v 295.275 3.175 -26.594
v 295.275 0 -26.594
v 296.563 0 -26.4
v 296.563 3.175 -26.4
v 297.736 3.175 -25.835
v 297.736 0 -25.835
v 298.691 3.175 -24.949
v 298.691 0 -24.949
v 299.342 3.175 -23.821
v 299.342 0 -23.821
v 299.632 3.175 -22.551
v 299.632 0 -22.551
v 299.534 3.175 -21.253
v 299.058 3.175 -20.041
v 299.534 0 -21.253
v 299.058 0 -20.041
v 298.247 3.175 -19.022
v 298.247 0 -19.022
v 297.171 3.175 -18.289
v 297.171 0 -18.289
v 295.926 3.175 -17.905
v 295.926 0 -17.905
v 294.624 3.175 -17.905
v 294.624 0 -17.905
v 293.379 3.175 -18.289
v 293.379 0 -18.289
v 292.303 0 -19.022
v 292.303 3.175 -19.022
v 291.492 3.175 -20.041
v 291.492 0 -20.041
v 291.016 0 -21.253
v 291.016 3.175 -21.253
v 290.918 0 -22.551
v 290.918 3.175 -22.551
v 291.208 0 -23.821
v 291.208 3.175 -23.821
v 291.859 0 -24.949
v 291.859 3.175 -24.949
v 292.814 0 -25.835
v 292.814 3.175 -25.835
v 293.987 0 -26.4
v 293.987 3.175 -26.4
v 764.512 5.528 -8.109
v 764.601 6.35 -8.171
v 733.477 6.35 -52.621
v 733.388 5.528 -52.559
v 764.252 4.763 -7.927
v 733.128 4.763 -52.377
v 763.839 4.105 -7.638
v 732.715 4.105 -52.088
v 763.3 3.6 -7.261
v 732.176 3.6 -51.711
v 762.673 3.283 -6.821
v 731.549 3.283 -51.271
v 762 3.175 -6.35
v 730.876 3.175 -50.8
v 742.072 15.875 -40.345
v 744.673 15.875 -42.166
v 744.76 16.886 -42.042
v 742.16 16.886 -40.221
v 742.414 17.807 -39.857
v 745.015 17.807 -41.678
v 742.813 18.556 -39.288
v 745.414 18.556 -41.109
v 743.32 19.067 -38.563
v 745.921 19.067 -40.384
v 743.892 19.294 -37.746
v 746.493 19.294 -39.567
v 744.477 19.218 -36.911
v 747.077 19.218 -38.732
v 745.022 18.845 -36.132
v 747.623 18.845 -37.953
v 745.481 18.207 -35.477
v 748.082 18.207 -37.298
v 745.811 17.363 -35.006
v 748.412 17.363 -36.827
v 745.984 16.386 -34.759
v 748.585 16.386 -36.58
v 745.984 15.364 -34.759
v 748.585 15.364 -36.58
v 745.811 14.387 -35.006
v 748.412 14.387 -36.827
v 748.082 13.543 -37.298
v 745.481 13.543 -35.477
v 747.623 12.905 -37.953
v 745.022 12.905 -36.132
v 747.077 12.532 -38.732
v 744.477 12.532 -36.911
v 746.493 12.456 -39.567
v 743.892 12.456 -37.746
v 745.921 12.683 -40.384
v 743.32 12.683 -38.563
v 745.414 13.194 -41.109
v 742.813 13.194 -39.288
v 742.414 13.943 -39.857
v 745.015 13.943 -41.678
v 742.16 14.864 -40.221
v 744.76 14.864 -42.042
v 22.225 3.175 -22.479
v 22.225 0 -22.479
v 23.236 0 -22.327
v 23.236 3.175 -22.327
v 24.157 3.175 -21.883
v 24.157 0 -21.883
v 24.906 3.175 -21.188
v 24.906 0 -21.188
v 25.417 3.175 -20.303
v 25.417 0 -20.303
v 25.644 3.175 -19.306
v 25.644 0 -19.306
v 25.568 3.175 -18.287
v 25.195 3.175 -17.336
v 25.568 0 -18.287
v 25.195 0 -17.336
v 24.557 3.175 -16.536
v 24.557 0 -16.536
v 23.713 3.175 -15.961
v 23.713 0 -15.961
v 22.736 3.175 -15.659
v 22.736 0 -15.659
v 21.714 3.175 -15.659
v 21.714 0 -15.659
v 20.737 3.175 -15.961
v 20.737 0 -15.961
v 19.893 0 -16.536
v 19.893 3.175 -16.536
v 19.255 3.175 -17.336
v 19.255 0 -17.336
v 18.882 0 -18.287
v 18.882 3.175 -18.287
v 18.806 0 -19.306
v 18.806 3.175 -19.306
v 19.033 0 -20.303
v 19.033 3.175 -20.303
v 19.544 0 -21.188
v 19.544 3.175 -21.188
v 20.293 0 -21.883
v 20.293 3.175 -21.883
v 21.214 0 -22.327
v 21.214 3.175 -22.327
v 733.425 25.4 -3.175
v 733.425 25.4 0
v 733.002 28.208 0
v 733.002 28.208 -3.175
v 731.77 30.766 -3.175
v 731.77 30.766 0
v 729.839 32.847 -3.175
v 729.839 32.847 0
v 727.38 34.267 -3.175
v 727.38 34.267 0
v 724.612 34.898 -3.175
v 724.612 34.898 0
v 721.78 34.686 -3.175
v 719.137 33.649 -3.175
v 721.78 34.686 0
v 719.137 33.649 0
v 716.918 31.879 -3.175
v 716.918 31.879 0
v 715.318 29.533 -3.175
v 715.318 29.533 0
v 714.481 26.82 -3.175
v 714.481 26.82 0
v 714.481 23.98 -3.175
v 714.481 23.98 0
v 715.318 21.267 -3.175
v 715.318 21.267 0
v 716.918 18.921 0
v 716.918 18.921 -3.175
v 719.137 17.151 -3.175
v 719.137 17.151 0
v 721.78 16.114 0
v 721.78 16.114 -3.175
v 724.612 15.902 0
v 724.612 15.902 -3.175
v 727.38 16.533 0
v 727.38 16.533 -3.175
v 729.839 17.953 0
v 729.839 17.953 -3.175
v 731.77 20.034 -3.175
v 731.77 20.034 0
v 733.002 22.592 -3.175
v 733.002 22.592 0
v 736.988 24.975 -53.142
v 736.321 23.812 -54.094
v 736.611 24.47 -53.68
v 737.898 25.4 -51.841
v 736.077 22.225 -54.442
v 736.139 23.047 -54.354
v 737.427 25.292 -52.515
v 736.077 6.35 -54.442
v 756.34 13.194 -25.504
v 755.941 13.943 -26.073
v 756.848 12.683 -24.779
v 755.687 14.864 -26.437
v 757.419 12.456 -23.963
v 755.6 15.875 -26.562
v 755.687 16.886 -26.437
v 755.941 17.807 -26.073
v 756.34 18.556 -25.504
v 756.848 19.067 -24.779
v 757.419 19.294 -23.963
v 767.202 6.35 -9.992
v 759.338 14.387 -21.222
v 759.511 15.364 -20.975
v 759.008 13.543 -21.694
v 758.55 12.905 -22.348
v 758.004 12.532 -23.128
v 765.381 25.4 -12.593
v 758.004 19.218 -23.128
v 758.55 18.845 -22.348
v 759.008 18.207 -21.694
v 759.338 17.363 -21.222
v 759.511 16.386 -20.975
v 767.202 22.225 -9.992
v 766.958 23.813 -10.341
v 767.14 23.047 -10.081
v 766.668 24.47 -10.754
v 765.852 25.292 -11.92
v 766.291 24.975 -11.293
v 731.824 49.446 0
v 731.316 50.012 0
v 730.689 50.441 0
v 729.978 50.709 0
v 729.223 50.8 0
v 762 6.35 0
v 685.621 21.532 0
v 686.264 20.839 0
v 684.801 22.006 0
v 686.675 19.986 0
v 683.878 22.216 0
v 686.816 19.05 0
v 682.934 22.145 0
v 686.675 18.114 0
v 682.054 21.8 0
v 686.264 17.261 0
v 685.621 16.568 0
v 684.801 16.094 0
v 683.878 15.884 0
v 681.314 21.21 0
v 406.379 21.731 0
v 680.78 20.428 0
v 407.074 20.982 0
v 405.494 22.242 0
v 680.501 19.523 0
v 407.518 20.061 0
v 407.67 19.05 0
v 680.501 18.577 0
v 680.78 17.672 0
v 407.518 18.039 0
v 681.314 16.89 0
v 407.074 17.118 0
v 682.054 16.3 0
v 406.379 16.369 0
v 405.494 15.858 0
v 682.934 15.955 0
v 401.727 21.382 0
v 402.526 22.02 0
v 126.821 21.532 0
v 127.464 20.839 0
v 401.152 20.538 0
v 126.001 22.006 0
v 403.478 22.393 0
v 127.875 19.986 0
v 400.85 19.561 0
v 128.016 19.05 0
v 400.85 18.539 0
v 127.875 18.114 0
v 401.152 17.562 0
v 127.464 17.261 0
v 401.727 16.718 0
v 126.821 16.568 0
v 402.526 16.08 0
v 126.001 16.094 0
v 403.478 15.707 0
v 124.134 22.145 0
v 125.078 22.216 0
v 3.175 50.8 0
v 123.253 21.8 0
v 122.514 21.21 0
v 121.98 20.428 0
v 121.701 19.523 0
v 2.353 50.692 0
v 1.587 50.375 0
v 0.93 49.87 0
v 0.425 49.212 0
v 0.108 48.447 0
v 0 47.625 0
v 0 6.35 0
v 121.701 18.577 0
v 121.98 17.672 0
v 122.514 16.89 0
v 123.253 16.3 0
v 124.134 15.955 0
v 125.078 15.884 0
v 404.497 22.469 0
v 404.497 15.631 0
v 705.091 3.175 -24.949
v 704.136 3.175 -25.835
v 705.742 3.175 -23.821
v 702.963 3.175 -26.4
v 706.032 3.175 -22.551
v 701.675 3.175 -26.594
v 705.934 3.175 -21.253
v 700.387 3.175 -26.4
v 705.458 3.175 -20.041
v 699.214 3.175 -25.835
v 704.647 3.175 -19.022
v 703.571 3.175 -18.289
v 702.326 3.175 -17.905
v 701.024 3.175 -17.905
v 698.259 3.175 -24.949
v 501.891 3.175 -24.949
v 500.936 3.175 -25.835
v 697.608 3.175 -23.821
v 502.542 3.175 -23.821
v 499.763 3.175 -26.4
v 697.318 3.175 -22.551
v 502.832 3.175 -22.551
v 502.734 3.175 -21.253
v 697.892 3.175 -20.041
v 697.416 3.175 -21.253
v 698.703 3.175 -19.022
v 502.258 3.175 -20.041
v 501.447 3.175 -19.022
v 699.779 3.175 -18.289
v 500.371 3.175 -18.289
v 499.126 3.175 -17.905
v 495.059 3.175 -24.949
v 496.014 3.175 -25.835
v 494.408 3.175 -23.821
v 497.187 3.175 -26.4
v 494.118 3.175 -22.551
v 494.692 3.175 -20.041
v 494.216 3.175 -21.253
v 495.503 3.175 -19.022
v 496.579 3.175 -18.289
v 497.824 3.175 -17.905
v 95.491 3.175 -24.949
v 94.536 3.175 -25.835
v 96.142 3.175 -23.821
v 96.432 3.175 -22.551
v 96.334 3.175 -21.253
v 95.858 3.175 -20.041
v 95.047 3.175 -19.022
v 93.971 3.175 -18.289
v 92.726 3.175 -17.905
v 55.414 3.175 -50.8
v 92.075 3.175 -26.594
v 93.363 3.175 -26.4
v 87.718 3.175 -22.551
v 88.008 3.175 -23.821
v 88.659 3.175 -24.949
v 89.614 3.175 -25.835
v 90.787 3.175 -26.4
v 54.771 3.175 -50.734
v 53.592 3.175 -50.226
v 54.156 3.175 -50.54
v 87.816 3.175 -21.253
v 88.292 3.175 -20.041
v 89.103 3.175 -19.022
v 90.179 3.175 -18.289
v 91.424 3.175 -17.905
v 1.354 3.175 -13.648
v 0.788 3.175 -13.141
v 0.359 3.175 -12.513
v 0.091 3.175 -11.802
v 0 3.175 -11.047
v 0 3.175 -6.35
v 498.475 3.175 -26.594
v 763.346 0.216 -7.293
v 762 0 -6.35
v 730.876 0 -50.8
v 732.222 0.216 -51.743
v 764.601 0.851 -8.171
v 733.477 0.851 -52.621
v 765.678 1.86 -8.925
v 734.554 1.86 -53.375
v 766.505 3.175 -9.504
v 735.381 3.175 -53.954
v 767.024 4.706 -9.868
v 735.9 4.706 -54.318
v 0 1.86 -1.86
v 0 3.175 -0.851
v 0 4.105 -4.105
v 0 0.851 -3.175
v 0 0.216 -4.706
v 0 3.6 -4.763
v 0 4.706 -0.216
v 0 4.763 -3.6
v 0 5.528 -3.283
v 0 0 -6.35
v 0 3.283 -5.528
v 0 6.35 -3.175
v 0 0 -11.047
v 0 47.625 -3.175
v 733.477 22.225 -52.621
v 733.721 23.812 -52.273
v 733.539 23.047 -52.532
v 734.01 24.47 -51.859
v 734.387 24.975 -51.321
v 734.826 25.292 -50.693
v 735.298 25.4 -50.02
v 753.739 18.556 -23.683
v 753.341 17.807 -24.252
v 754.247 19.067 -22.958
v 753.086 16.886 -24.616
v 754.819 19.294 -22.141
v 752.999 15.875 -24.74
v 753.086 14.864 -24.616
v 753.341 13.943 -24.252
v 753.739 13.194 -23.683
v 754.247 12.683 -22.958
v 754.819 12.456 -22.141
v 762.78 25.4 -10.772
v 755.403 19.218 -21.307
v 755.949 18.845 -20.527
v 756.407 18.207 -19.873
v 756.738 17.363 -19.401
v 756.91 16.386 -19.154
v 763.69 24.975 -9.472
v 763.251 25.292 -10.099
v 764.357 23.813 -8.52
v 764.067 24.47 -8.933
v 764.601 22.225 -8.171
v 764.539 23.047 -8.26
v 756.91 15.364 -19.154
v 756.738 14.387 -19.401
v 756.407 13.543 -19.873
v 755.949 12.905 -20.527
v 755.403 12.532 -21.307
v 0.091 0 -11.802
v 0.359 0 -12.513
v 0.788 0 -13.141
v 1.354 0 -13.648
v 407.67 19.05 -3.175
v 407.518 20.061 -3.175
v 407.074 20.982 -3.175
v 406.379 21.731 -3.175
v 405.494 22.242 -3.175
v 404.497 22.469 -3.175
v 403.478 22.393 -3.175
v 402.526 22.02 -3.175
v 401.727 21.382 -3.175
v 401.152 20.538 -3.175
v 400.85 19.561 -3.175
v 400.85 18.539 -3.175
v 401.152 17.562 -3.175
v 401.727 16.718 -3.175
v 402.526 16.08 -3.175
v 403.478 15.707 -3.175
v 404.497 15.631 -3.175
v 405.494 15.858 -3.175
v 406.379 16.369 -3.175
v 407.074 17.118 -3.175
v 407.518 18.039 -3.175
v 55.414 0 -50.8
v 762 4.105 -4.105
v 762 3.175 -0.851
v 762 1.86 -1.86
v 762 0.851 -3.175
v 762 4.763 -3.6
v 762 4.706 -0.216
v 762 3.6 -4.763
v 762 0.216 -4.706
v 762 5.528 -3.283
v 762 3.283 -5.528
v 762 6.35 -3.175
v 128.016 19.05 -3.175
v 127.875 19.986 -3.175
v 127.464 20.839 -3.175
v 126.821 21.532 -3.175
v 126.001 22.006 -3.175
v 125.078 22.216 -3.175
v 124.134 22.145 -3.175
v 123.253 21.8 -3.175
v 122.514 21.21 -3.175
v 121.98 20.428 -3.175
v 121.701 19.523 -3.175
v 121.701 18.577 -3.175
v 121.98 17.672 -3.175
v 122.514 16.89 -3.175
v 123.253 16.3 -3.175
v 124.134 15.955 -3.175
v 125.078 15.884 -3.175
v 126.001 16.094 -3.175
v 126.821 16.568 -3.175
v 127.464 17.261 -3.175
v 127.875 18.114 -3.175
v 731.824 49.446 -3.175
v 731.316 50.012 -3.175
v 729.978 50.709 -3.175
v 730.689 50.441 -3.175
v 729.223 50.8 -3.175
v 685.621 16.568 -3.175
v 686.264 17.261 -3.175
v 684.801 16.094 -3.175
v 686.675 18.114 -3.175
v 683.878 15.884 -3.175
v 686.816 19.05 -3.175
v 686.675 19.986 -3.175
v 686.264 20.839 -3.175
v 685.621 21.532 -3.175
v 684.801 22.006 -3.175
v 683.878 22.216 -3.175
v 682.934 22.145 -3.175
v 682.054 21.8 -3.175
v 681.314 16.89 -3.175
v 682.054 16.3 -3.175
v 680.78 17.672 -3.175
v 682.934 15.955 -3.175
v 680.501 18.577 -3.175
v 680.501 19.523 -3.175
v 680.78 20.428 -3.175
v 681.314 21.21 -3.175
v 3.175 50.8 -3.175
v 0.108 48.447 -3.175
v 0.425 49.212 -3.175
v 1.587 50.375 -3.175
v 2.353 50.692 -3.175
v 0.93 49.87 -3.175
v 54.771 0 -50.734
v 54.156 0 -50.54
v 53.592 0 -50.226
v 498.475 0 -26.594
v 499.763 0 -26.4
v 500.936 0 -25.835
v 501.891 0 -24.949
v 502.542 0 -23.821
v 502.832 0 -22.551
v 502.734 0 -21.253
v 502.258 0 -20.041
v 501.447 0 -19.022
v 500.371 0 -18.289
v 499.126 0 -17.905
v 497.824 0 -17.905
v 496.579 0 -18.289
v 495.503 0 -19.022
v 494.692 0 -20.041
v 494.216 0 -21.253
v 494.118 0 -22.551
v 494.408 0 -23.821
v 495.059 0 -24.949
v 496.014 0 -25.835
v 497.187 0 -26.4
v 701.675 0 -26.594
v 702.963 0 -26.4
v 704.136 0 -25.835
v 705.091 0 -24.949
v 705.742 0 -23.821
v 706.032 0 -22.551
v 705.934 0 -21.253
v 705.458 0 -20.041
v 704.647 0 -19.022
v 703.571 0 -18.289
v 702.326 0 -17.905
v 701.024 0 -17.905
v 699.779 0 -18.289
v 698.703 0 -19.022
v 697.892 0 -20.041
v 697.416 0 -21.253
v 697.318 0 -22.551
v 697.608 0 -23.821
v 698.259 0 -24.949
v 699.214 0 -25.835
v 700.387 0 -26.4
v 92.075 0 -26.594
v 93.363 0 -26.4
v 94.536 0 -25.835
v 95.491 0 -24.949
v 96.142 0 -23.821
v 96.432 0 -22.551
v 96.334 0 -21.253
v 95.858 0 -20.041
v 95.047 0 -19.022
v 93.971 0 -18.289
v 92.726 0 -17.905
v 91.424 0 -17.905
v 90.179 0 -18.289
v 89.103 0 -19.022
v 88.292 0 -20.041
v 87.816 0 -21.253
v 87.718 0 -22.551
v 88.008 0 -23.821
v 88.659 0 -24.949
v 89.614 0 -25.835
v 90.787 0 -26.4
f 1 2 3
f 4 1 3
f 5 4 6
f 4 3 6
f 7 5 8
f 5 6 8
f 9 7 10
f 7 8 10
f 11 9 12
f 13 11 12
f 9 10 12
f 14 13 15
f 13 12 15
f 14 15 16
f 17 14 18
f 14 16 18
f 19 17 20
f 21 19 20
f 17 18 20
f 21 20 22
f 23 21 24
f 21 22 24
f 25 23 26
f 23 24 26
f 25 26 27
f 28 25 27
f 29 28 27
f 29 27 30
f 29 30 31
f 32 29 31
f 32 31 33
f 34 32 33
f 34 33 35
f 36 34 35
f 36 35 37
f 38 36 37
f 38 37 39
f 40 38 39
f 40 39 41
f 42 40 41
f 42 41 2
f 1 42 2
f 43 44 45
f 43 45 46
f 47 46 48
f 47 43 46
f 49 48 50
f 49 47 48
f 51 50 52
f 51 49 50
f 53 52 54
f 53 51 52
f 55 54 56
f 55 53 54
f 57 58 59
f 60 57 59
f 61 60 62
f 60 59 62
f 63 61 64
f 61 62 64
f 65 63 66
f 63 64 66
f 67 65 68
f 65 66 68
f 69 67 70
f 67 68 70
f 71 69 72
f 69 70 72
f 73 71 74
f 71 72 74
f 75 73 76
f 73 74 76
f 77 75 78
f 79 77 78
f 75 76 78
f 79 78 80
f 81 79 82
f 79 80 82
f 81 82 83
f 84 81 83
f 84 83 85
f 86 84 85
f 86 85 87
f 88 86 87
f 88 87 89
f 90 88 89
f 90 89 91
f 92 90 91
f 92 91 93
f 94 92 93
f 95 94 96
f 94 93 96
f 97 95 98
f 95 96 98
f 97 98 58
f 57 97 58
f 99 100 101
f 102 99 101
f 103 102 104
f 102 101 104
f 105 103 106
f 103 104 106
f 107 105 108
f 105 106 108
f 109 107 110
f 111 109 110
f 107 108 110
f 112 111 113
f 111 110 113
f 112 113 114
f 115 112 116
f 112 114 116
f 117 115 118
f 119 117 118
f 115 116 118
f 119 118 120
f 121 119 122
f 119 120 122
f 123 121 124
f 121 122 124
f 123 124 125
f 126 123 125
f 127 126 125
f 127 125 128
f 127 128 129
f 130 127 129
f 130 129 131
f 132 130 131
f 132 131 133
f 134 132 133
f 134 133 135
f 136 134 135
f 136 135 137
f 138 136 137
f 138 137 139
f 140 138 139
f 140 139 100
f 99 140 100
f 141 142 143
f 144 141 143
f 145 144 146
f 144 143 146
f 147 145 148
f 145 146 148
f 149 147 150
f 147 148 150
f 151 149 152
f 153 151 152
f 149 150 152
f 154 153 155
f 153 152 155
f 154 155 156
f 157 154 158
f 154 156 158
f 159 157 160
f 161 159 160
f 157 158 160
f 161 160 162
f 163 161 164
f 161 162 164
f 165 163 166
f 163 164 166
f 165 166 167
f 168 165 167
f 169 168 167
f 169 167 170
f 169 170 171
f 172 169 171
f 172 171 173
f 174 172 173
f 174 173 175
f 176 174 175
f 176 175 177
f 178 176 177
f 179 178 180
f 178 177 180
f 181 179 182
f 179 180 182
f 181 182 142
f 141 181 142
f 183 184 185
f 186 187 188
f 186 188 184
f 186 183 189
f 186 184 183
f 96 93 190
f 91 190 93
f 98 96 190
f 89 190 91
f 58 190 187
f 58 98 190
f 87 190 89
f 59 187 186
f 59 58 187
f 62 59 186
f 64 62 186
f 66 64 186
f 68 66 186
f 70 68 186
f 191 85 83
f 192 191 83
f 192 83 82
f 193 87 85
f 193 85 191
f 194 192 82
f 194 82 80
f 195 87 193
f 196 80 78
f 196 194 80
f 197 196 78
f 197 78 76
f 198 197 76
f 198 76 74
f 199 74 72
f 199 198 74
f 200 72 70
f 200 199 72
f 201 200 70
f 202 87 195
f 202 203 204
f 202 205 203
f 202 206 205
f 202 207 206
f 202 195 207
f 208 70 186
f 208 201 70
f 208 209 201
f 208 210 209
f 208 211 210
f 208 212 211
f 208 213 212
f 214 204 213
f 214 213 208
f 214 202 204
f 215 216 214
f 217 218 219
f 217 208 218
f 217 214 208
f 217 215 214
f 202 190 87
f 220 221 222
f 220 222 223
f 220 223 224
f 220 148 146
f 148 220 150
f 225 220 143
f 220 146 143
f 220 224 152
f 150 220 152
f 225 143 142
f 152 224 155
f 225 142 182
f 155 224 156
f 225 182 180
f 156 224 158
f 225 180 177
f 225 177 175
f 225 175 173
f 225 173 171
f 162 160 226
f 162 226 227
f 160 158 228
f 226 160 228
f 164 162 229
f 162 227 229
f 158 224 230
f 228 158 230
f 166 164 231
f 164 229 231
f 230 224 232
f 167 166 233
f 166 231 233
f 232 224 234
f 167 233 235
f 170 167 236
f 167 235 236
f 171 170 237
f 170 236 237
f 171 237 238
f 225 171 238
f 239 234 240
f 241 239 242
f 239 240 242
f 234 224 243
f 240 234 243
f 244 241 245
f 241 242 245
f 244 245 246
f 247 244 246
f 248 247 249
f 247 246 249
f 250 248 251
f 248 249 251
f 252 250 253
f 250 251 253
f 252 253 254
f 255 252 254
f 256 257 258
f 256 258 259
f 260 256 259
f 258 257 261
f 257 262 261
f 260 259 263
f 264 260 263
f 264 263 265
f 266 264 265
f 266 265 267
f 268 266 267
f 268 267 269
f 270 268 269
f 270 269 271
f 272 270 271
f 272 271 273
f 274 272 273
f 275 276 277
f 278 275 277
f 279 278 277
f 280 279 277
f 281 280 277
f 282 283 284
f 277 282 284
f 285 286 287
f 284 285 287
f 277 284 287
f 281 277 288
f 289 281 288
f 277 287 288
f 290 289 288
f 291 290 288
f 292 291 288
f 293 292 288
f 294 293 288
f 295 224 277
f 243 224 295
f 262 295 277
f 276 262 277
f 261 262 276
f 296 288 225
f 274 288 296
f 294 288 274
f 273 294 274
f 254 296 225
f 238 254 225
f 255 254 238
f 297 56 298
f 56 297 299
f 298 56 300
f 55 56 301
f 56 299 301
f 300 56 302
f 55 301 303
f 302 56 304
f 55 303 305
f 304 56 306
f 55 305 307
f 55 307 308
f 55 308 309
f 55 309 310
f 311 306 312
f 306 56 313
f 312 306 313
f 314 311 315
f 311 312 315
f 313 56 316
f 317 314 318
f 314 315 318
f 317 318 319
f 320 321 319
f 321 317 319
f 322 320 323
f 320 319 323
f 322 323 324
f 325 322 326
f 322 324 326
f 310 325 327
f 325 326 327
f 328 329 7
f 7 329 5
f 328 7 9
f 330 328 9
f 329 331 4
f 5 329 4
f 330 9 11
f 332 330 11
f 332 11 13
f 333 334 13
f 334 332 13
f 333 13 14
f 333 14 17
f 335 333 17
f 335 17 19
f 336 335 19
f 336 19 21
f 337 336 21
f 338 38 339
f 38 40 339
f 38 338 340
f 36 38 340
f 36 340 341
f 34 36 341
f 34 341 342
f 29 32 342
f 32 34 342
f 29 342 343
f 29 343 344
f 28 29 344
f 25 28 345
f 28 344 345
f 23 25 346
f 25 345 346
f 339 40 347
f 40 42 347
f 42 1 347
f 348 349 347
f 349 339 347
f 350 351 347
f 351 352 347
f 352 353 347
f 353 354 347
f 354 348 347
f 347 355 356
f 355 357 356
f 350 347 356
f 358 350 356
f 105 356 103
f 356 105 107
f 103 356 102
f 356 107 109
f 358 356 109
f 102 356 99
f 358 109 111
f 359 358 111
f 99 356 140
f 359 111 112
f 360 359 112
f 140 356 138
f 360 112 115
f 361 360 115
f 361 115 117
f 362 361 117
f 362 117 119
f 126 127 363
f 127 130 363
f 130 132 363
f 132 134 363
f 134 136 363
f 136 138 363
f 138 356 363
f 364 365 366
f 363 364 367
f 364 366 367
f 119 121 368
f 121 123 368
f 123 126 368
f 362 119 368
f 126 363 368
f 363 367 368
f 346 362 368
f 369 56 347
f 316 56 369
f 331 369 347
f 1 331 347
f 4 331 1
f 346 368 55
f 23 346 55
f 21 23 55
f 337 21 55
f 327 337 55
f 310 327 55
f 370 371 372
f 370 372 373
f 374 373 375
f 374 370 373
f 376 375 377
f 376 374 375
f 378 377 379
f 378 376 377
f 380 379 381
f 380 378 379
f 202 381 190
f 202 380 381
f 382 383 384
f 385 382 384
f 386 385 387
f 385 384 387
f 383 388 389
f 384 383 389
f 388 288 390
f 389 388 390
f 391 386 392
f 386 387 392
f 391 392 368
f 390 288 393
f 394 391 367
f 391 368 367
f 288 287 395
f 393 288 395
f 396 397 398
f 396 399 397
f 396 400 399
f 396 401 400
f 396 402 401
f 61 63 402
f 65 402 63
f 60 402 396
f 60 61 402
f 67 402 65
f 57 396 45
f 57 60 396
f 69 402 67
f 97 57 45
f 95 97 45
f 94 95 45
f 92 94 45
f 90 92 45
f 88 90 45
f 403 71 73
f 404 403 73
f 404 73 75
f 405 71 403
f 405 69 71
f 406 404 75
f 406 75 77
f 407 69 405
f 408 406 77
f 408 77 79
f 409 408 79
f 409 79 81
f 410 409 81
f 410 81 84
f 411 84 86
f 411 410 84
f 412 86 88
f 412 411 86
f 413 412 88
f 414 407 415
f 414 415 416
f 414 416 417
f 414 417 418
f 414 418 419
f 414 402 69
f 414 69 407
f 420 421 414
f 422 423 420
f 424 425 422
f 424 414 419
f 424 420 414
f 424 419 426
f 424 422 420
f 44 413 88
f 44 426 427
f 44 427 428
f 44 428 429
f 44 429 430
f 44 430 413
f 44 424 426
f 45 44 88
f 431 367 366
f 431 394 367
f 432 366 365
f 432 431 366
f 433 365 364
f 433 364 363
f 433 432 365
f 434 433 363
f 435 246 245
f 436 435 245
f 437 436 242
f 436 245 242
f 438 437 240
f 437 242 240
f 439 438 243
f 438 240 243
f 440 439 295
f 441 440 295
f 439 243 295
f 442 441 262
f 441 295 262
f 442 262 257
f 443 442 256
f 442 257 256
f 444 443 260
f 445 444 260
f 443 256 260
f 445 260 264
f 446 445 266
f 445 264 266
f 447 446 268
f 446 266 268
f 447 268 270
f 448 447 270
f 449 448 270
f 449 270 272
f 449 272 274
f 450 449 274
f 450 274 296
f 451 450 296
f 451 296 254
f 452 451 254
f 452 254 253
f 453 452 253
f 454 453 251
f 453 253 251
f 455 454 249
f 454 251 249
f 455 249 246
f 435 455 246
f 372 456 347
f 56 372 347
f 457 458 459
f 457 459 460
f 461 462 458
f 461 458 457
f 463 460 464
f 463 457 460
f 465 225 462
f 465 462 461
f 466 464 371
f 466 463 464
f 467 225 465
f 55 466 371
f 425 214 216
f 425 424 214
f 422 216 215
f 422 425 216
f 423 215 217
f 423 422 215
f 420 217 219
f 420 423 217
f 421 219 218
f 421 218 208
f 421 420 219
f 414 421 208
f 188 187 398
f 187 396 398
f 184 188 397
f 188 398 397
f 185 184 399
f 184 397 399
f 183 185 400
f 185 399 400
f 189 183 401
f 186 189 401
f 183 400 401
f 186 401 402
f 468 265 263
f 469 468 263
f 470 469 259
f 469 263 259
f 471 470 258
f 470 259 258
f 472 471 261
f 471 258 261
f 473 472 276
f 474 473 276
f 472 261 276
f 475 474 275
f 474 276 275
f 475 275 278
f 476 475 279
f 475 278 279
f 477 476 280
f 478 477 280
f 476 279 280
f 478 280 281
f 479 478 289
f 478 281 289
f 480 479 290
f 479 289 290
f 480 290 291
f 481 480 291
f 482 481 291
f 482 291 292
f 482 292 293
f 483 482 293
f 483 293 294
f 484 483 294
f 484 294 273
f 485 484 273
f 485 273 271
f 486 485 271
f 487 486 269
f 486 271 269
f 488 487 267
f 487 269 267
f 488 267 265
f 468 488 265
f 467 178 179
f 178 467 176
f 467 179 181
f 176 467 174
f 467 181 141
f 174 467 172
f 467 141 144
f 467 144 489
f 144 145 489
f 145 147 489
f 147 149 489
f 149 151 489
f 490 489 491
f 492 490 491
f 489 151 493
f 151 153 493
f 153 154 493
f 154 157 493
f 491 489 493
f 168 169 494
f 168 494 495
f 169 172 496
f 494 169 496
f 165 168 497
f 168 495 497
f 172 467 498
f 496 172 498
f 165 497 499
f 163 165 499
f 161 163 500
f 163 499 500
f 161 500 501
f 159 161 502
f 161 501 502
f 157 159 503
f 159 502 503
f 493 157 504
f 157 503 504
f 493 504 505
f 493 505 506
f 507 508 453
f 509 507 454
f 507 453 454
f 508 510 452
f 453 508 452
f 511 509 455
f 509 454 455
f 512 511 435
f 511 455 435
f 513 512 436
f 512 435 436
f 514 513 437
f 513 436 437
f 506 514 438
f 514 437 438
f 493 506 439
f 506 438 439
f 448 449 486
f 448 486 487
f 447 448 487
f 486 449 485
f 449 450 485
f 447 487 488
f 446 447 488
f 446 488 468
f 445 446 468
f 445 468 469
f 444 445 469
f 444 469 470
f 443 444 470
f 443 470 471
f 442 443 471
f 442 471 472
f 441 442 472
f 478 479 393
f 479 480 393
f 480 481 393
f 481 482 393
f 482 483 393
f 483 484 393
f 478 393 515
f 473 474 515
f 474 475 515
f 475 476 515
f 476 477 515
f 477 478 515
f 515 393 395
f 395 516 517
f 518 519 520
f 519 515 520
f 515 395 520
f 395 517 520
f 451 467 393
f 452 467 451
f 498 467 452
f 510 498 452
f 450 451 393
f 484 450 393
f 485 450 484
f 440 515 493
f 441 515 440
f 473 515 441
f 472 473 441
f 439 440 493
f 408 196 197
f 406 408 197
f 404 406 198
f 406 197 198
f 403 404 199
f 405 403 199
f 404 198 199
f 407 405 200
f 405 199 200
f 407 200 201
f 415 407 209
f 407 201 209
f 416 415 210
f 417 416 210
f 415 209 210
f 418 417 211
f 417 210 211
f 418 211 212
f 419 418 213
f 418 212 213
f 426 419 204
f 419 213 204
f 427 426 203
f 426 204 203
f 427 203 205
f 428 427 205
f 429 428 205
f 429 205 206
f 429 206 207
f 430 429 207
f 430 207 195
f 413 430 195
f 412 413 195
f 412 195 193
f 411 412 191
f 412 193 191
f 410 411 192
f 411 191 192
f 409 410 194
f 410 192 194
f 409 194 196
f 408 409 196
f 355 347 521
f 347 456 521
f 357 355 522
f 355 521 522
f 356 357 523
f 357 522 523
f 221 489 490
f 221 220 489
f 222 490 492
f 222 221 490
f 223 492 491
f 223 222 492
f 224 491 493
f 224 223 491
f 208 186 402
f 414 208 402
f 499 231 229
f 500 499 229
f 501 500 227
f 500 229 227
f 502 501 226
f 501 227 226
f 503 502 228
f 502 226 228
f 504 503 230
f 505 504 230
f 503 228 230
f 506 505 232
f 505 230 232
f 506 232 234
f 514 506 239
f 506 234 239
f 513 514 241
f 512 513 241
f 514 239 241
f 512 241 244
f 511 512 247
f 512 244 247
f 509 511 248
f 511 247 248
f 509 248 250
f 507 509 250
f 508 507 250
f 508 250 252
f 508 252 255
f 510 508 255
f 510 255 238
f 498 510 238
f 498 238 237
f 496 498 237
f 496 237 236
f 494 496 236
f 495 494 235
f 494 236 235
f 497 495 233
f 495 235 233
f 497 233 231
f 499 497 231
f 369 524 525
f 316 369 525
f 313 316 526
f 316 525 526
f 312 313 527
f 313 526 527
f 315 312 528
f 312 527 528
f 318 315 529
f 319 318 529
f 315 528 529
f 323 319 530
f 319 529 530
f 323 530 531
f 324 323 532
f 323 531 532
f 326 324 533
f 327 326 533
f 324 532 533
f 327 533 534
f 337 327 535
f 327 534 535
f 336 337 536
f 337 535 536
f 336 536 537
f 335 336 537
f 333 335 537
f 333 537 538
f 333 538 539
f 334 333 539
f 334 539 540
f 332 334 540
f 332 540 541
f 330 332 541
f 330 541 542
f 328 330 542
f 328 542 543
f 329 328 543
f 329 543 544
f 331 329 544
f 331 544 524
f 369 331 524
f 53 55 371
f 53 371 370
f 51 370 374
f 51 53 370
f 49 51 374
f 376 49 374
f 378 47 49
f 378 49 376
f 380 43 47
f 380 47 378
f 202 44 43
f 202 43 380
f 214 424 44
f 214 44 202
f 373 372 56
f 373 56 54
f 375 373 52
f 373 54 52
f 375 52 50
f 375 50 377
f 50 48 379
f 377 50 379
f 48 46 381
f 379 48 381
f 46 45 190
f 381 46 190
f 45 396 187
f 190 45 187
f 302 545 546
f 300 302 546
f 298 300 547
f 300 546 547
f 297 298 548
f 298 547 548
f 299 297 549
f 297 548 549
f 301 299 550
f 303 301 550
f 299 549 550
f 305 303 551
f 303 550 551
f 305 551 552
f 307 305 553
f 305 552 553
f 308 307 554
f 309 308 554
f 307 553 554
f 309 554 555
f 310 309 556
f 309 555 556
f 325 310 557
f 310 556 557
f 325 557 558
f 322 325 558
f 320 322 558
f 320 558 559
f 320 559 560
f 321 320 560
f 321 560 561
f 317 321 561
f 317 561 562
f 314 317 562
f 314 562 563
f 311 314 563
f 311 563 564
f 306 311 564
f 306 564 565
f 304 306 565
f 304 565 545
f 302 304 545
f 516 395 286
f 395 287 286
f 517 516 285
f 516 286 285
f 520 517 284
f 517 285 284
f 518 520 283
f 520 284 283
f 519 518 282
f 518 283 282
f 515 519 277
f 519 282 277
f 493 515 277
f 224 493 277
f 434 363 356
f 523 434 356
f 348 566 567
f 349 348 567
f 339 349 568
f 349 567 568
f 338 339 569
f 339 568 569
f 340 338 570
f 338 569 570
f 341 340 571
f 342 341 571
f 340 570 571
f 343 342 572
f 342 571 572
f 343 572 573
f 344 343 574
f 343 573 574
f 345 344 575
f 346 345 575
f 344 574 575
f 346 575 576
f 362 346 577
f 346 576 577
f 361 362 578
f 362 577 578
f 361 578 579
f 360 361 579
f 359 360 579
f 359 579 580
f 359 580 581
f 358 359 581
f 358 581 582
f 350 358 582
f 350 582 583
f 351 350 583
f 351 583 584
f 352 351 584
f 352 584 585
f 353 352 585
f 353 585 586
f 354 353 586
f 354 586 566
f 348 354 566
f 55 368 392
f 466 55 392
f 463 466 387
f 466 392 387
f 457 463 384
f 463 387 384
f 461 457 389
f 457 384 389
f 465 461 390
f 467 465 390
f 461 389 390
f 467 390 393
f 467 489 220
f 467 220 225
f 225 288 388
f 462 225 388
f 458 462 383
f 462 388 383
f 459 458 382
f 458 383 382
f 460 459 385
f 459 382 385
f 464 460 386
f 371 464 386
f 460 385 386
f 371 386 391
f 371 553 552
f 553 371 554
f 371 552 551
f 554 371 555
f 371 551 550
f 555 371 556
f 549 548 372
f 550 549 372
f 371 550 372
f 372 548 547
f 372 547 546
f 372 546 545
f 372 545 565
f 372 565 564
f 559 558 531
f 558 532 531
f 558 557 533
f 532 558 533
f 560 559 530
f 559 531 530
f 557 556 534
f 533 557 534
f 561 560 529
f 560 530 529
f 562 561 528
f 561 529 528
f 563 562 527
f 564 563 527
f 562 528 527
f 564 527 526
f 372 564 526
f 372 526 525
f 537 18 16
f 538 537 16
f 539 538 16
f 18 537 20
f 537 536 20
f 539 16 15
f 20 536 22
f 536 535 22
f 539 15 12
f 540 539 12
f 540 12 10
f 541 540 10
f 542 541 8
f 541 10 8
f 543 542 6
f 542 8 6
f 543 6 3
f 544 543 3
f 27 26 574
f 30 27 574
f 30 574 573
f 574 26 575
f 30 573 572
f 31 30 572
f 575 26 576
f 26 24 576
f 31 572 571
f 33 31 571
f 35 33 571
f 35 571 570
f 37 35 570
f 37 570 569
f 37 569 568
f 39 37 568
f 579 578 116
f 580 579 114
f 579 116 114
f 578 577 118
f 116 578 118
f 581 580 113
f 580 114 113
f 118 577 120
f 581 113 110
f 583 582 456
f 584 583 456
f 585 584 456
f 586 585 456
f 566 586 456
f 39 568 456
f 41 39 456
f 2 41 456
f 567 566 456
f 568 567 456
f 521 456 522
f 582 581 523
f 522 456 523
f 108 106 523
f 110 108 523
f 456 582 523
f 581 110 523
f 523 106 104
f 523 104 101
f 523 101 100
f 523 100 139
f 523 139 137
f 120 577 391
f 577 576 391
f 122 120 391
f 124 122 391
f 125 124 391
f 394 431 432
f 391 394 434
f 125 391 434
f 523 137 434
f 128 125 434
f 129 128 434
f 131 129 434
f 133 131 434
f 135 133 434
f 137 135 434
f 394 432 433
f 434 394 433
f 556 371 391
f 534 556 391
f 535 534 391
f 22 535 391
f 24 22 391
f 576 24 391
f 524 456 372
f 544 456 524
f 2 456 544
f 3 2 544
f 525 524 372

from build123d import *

# Parameters (mm, degrees)
BASE_FLANGE1_DEPTH = 762
CUT_EXTRUDE1_DEPTH = 3.175
CUT_EXTRUDE2_DEPTH = 3.175
EDGE_FLANGE1_DEPTH = 54.26343047
SKETCH9_R          = 3.175
SKETCH9_R_2        = 9.525
SKETCH9_R_3        = 3.429
CUT_EXTRUDE3_DEPTH = 3.175
SKETCH10_R         = 4.3688
SKETCH10_R_2       = 3.429
CUT_EXTRUDE4_DEPTH = 4.9022
SKETCH11_R         = 3.429
CUT_EXTRUDE5_DEPTH = 3.175
FILLET1_R          = 3.175


# Sheet-metal steps are written as plain solids
with BuildPart() as part:
    # Sketch1 → Base-Flange1 (new body)
    with BuildSketch(Plane(origin=(0, 0, 0), x_dir=(0, 0, -1), z_dir=(1, 0, 0))):
        with BuildLine():
            Line((0, 50.8), (0, 6.35))
            ThreePointArc((0, 6.35), (1.859871939, 1.859871939), (6.35, 0))
            Line((6.35, 0), (50.8, 0))
            Line((50.8, 0), (50.8, 3.175))
            Line((50.8, 3.175), (6.35, 3.175))
            ThreePointArc((6.35, 3.175), (4.10493597, 4.10493597), (3.175, 6.35))
            Line((3.175, 6.35), (3.175, 50.8))
            Line((3.175, 50.8), (0, 50.8))
        make_face()
    extrude(amount=BASE_FLANGE1_DEPTH)

    # Sketch3 → Cut-Extrude1 (cut)
    with BuildSketch(Plane(origin=(0, 0, -3.175), x_dir=(-1, 0, 0), z_dir=(0, 0, -1))):
        Polygon((-762, 6.35), (-762, 50.8), (-730.875774927, 50.8), align=None)
    extrude(amount=-CUT_EXTRUDE1_DEPTH, mode=Mode.SUBTRACT)

    # Sketch4 → Cut-Extrude2 (cut)
    with BuildSketch(Plane(origin=(0, 3.175, 0), x_dir=(1, 0, 0), z_dir=(0, 1, 0))):
        Polygon((762, 6.35), (730.875774927, 50.8), (762, 50.8), align=None)
        Polygon((0, 12.7), (54.412439057, 50.8), (0, 50.8), align=None)
    extrude(amount=-CUT_EXTRUDE2_DEPTH, mode=Mode.SUBTRACT)

    # Edge-Flange1 section (across the edge) → Edge-Flange1 (add)
    with BuildSketch(Plane(origin=(764.600807741, 3.175, -8.171105185), x_dir=(-0.8191520442889946, 3.4914813388431337e-15, 0.5735764363510422), z_dir=(-0.5735764363510422, 0, -0.8191520442889946))):
        with BuildLine():
            Line((-3.175, 3.175), (-3.175, 22.225))
            Line((-3.175, 22.225), (0, 22.225))
            Line((0, 22.225), (0, 3.175))
            ThreePointArc((0, 3.175), (0.92993597, 0.92993597), (3.175, 0))
            Line((3.175, 0), (3.175, -3.175))
            ThreePointArc((3.175, -3.175), (-1.315128061, -1.315128061), (-3.175, 3.175))
        make_face()
    extrude(amount=EDGE_FLANGE1_DEPTH)

    # Sketch9 → Cut-Extrude3 (cut)
    with BuildSketch(Plane.XY):
        with Locations((124.841, 19.05)):
            Circle(SKETCH9_R)
        with Locations((683.641, 19.05)):
            Circle(SKETCH9_R)
        with Locations((723.9, 25.4)):
            Circle(SKETCH9_R_2)
        with Locations((404.241, 19.05)):
            Circle(SKETCH9_R_3)
    extrude(amount=-CUT_EXTRUDE3_DEPTH, mode=Mode.SUBTRACT)

    # Sketch10 → Cut-Extrude4 (cut)
    with BuildSketch(Plane.XZ):
        with Locations(Location((92.075, -22.225, 0), (0, 0, 270))):
            Circle(SKETCH10_R)
        with Locations(Location((295.275, -22.225, 0), (0, 0, 270))):
            Circle(SKETCH10_R)
        with Locations(Location((498.475, -22.225, 0), (0, 0, 270))):
            Circle(SKETCH10_R)
        with Locations(Location((701.675, -22.225, 0), (0, 0, 270))):
            Circle(SKETCH10_R)
        with Locations(Location((22.225, -19.05, 0), (0, 0, 270))):
            Circle(SKETCH10_R_2)
    extrude(amount=-CUT_EXTRUDE4_DEPTH, mode=Mode.SUBTRACT)

    # Sketch11 → Cut-Extrude5 (cut)
    with BuildSketch(Plane(origin=(519.494814159, 0, -363.754184935), x_dir=(-0.5735764363510422, 1.0031284501279259e-15, -0.8191520442889946), z_dir=(0.8191520442889947, -1.4326158965565184e-15, -0.5735764363510422))):
        with Locations((-396.015198548, 15.875)):
            Circle(SKETCH11_R)
        with Locations((-415.065198548, 15.875)):
            Circle(SKETCH11_R)
    extrude(amount=-CUT_EXTRUDE5_DEPTH, mode=Mode.SUBTRACT)

    # Fillet1
    fillet1_edges = [part.edges().sort_by_distance(p)[0] for p in [
        (730.875774927, 50.8, -1.5875),
        (0, 1.5875, -12.7),
        (54.412439057, 1.5875, -50.8),
        (765.901211611, 25.4, -9.081657778),
        (734.776986538, 25.4, -53.531657778),
        (0, 50.8, -1.5875),
    ]]
    fillet(fillet1_edges, radius=FILLET1_R)


solid = part.part
